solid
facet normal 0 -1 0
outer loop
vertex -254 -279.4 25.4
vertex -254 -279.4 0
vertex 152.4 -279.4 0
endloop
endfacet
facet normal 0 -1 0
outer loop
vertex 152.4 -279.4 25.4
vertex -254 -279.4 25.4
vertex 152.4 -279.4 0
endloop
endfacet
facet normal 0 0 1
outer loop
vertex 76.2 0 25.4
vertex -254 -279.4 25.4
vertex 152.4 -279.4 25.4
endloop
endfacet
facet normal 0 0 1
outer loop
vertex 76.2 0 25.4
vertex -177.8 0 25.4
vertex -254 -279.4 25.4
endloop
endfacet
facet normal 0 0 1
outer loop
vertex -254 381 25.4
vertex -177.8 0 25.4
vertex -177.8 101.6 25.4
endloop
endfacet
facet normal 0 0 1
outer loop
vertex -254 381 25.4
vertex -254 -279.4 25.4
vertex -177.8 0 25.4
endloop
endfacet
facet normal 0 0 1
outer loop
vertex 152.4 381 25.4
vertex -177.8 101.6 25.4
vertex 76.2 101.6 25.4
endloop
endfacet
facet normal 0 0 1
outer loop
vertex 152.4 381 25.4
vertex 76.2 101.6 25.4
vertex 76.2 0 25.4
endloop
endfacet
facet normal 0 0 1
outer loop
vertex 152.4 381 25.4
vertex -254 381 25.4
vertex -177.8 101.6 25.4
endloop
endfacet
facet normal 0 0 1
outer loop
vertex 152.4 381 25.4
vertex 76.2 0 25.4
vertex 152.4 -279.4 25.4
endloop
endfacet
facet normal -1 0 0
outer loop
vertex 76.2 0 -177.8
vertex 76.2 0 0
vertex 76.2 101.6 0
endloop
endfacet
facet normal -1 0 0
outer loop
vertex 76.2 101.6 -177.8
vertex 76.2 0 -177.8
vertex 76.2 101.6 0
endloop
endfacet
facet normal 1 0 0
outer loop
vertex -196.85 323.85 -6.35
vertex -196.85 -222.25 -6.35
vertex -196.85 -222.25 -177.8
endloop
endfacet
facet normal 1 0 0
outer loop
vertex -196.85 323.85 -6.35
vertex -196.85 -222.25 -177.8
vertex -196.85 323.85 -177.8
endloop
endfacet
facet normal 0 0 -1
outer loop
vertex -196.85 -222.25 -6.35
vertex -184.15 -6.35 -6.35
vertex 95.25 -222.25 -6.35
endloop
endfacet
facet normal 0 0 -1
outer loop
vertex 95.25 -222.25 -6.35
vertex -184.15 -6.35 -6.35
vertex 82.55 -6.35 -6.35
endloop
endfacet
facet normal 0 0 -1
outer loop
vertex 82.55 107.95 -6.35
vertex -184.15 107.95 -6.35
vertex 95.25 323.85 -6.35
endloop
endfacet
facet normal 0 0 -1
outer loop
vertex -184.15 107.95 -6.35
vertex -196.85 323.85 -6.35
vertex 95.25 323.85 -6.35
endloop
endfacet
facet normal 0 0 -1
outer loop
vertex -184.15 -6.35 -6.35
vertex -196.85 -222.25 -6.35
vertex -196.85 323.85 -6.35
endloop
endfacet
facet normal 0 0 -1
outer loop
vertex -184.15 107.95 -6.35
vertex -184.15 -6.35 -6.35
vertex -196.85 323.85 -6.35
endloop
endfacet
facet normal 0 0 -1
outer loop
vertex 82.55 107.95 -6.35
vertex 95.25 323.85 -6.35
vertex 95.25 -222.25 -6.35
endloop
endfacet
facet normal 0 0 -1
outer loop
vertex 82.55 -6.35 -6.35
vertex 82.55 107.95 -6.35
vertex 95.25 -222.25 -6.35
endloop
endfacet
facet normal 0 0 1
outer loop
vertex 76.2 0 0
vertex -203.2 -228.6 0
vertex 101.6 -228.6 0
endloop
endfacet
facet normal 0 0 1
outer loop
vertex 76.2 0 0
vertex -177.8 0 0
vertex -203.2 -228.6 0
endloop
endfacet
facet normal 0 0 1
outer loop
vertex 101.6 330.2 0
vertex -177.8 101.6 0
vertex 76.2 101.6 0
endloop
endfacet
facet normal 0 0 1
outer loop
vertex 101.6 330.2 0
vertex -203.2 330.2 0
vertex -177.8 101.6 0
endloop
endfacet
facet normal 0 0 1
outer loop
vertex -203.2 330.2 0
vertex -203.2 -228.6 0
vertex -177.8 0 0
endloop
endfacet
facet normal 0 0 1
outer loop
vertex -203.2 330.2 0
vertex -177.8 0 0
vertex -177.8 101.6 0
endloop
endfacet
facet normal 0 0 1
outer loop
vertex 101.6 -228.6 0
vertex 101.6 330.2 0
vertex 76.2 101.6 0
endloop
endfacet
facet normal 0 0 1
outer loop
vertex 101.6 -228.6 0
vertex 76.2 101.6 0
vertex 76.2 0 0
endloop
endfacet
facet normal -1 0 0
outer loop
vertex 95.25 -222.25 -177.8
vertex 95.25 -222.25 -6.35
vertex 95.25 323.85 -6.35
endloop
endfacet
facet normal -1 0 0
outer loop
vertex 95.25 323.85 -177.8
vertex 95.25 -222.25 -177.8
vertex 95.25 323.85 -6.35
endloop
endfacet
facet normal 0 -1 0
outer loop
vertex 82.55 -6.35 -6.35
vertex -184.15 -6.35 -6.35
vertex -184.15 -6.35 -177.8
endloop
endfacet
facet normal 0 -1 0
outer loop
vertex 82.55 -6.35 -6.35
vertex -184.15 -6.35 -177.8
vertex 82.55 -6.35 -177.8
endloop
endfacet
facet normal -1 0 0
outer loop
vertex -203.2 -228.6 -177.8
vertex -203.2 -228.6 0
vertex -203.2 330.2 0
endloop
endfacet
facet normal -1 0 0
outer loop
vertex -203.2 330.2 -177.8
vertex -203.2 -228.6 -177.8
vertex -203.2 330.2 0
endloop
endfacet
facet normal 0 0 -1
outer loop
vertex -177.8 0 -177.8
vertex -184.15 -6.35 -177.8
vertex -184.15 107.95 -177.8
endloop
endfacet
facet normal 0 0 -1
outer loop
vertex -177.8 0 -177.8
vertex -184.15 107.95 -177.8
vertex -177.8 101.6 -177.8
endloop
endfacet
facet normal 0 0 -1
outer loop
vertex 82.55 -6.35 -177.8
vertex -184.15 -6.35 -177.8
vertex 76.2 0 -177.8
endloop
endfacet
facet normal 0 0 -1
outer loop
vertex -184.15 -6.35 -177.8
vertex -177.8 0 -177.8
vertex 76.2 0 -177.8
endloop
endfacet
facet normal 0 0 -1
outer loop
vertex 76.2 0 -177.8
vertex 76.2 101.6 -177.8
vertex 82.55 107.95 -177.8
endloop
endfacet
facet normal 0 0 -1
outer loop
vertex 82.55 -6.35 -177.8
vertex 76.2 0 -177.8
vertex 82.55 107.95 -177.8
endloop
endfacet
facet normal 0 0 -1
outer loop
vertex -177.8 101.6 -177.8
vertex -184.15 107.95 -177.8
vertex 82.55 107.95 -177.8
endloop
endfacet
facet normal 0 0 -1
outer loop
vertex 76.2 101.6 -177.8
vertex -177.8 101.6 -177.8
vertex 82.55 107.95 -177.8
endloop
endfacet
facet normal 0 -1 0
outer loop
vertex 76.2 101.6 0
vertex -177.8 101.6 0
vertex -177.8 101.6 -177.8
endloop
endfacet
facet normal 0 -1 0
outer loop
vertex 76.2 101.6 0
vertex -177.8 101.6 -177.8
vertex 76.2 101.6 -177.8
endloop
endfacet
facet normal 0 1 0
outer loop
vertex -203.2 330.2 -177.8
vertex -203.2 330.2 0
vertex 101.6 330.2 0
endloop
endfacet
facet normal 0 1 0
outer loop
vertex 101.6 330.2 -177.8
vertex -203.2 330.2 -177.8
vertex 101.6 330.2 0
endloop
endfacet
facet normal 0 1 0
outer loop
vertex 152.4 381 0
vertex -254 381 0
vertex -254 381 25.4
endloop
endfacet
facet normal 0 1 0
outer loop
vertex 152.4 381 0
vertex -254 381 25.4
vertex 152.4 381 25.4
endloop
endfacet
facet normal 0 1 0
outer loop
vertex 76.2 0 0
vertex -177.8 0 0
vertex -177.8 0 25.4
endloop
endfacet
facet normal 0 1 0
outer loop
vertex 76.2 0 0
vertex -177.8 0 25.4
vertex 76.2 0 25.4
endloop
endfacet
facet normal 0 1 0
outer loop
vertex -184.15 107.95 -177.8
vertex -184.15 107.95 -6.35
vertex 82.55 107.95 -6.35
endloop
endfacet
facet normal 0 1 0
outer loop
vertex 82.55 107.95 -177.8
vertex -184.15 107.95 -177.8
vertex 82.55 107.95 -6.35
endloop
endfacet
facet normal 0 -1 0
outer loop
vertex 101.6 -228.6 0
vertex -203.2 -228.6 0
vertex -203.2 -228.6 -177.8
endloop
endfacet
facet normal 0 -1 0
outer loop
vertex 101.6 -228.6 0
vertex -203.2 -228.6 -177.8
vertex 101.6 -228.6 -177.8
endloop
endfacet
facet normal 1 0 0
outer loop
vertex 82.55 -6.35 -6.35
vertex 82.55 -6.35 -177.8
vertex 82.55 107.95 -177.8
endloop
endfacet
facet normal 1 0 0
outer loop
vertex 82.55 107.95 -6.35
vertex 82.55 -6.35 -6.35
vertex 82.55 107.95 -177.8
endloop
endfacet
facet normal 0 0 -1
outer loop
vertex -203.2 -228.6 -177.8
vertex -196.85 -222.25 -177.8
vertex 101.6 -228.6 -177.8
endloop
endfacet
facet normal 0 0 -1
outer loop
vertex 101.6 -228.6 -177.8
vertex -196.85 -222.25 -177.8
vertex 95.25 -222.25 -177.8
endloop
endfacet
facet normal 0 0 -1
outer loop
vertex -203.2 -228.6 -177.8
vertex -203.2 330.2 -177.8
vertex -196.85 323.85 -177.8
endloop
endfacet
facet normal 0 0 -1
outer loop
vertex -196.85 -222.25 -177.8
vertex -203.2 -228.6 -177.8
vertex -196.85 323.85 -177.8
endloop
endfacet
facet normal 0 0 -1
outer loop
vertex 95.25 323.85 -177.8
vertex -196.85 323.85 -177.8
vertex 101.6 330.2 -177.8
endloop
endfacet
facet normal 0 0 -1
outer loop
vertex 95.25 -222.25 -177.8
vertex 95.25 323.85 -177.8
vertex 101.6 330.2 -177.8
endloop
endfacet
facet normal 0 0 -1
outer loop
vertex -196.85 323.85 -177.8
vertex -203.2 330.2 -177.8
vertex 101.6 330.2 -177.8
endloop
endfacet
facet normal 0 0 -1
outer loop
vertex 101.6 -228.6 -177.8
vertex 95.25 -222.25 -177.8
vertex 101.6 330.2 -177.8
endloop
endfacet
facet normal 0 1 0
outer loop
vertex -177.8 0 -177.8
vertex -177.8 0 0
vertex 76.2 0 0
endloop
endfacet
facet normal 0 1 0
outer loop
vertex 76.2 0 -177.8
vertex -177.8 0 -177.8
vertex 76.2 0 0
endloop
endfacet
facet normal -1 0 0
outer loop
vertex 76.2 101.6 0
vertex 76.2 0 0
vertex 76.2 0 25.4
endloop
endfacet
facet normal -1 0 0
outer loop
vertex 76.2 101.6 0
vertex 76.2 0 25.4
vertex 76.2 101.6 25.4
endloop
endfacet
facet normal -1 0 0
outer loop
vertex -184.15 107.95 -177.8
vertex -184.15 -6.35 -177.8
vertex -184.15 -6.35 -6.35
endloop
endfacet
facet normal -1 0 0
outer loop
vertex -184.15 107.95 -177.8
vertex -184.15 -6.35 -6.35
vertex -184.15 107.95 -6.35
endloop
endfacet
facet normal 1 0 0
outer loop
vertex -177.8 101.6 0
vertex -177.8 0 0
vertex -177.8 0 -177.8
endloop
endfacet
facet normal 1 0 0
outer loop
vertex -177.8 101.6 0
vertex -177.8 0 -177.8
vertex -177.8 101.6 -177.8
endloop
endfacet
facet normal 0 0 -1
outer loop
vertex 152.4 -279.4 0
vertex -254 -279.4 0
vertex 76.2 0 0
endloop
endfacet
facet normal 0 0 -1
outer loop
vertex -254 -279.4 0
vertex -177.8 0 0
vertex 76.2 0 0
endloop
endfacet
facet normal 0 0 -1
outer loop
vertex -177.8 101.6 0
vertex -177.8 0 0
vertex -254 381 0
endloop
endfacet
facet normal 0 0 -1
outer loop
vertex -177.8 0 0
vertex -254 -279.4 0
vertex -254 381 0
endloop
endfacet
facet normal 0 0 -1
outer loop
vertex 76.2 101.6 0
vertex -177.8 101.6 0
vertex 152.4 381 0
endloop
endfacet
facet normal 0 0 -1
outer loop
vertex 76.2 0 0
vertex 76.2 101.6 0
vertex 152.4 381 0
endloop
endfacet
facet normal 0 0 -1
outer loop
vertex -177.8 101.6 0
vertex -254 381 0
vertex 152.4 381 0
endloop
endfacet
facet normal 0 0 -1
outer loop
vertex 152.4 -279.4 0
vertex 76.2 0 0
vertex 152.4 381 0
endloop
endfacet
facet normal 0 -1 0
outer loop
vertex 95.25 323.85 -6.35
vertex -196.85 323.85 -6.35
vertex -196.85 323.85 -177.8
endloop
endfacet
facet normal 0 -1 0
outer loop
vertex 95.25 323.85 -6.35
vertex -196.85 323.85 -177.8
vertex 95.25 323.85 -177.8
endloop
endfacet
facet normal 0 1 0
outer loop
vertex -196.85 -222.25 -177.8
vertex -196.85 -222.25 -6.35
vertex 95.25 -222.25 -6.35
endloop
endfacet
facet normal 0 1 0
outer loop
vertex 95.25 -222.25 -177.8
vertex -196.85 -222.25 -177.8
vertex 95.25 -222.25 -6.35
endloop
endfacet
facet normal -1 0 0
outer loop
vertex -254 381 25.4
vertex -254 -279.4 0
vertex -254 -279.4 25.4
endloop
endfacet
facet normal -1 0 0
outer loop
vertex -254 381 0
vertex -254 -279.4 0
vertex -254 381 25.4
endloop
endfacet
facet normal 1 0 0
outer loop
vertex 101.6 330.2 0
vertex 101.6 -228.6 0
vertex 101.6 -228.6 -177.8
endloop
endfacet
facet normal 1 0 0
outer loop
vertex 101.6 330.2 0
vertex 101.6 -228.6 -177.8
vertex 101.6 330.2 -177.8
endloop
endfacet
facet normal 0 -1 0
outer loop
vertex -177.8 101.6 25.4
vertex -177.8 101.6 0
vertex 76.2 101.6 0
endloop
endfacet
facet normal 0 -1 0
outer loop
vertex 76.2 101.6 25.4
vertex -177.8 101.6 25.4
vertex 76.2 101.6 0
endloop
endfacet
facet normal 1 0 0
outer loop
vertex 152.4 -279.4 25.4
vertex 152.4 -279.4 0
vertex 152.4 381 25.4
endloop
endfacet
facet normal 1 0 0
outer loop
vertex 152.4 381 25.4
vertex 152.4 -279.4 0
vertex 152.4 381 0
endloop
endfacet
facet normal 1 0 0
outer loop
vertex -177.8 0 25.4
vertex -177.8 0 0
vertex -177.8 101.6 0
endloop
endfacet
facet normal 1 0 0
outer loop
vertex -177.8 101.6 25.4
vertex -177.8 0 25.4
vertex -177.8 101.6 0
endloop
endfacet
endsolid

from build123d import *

# Parameters (mm, degrees)
F0_W     = 406.4
F0_H     = 660.4
F0_W_2   = 304.8
F0_H_2   = 558.8
F0_W_3   = 254
F0_H_3   = 101.6
F2_DEPTH = 25.4
F3_DEPTH = 177.8
F4_T     = -6.35


with BuildPart() as f2:
    # F0 (on Top) → F2 (new body)
    with BuildSketch(Plane.XY):
        with Locations((-50.8, 50.8)):
            Rectangle(F0_W, F0_H)
        with Locations((-50.8, 50.8)):
            Rectangle(F0_W_2, F0_H_2, mode=Mode.SUBTRACT)
        with Locations((-50.8, 50.8)):
            Rectangle(F0_W_2, F0_H_2)
        with Locations((-50.8, 50.8)):
            Rectangle(F0_W_3, F0_H_3, mode=Mode.SUBTRACT)
    extrude(amount=F2_DEPTH)


with BuildPart() as f3:
    # F0 (on Top) → F3 (new body)
    with BuildSketch(Plane.XY):
        with Locations((-50.8, 50.8)):
            Rectangle(F0_W_2, F0_H_2)
        with Locations((-50.8, 50.8)):
            Rectangle(F0_W_3, F0_H_3, mode=Mode.SUBTRACT)
    extrude(amount=-F3_DEPTH)

    # F4
    f4_openings = [f3.faces().sort_by_distance(p)[0] for p in [
        (95.234778, 50.8, -177.8),
    ]]
    offset(amount=F4_T, openings=f4_openings, kind=Kind.INTERSECTION)


solid = Compound([f2.part, f3.part])
